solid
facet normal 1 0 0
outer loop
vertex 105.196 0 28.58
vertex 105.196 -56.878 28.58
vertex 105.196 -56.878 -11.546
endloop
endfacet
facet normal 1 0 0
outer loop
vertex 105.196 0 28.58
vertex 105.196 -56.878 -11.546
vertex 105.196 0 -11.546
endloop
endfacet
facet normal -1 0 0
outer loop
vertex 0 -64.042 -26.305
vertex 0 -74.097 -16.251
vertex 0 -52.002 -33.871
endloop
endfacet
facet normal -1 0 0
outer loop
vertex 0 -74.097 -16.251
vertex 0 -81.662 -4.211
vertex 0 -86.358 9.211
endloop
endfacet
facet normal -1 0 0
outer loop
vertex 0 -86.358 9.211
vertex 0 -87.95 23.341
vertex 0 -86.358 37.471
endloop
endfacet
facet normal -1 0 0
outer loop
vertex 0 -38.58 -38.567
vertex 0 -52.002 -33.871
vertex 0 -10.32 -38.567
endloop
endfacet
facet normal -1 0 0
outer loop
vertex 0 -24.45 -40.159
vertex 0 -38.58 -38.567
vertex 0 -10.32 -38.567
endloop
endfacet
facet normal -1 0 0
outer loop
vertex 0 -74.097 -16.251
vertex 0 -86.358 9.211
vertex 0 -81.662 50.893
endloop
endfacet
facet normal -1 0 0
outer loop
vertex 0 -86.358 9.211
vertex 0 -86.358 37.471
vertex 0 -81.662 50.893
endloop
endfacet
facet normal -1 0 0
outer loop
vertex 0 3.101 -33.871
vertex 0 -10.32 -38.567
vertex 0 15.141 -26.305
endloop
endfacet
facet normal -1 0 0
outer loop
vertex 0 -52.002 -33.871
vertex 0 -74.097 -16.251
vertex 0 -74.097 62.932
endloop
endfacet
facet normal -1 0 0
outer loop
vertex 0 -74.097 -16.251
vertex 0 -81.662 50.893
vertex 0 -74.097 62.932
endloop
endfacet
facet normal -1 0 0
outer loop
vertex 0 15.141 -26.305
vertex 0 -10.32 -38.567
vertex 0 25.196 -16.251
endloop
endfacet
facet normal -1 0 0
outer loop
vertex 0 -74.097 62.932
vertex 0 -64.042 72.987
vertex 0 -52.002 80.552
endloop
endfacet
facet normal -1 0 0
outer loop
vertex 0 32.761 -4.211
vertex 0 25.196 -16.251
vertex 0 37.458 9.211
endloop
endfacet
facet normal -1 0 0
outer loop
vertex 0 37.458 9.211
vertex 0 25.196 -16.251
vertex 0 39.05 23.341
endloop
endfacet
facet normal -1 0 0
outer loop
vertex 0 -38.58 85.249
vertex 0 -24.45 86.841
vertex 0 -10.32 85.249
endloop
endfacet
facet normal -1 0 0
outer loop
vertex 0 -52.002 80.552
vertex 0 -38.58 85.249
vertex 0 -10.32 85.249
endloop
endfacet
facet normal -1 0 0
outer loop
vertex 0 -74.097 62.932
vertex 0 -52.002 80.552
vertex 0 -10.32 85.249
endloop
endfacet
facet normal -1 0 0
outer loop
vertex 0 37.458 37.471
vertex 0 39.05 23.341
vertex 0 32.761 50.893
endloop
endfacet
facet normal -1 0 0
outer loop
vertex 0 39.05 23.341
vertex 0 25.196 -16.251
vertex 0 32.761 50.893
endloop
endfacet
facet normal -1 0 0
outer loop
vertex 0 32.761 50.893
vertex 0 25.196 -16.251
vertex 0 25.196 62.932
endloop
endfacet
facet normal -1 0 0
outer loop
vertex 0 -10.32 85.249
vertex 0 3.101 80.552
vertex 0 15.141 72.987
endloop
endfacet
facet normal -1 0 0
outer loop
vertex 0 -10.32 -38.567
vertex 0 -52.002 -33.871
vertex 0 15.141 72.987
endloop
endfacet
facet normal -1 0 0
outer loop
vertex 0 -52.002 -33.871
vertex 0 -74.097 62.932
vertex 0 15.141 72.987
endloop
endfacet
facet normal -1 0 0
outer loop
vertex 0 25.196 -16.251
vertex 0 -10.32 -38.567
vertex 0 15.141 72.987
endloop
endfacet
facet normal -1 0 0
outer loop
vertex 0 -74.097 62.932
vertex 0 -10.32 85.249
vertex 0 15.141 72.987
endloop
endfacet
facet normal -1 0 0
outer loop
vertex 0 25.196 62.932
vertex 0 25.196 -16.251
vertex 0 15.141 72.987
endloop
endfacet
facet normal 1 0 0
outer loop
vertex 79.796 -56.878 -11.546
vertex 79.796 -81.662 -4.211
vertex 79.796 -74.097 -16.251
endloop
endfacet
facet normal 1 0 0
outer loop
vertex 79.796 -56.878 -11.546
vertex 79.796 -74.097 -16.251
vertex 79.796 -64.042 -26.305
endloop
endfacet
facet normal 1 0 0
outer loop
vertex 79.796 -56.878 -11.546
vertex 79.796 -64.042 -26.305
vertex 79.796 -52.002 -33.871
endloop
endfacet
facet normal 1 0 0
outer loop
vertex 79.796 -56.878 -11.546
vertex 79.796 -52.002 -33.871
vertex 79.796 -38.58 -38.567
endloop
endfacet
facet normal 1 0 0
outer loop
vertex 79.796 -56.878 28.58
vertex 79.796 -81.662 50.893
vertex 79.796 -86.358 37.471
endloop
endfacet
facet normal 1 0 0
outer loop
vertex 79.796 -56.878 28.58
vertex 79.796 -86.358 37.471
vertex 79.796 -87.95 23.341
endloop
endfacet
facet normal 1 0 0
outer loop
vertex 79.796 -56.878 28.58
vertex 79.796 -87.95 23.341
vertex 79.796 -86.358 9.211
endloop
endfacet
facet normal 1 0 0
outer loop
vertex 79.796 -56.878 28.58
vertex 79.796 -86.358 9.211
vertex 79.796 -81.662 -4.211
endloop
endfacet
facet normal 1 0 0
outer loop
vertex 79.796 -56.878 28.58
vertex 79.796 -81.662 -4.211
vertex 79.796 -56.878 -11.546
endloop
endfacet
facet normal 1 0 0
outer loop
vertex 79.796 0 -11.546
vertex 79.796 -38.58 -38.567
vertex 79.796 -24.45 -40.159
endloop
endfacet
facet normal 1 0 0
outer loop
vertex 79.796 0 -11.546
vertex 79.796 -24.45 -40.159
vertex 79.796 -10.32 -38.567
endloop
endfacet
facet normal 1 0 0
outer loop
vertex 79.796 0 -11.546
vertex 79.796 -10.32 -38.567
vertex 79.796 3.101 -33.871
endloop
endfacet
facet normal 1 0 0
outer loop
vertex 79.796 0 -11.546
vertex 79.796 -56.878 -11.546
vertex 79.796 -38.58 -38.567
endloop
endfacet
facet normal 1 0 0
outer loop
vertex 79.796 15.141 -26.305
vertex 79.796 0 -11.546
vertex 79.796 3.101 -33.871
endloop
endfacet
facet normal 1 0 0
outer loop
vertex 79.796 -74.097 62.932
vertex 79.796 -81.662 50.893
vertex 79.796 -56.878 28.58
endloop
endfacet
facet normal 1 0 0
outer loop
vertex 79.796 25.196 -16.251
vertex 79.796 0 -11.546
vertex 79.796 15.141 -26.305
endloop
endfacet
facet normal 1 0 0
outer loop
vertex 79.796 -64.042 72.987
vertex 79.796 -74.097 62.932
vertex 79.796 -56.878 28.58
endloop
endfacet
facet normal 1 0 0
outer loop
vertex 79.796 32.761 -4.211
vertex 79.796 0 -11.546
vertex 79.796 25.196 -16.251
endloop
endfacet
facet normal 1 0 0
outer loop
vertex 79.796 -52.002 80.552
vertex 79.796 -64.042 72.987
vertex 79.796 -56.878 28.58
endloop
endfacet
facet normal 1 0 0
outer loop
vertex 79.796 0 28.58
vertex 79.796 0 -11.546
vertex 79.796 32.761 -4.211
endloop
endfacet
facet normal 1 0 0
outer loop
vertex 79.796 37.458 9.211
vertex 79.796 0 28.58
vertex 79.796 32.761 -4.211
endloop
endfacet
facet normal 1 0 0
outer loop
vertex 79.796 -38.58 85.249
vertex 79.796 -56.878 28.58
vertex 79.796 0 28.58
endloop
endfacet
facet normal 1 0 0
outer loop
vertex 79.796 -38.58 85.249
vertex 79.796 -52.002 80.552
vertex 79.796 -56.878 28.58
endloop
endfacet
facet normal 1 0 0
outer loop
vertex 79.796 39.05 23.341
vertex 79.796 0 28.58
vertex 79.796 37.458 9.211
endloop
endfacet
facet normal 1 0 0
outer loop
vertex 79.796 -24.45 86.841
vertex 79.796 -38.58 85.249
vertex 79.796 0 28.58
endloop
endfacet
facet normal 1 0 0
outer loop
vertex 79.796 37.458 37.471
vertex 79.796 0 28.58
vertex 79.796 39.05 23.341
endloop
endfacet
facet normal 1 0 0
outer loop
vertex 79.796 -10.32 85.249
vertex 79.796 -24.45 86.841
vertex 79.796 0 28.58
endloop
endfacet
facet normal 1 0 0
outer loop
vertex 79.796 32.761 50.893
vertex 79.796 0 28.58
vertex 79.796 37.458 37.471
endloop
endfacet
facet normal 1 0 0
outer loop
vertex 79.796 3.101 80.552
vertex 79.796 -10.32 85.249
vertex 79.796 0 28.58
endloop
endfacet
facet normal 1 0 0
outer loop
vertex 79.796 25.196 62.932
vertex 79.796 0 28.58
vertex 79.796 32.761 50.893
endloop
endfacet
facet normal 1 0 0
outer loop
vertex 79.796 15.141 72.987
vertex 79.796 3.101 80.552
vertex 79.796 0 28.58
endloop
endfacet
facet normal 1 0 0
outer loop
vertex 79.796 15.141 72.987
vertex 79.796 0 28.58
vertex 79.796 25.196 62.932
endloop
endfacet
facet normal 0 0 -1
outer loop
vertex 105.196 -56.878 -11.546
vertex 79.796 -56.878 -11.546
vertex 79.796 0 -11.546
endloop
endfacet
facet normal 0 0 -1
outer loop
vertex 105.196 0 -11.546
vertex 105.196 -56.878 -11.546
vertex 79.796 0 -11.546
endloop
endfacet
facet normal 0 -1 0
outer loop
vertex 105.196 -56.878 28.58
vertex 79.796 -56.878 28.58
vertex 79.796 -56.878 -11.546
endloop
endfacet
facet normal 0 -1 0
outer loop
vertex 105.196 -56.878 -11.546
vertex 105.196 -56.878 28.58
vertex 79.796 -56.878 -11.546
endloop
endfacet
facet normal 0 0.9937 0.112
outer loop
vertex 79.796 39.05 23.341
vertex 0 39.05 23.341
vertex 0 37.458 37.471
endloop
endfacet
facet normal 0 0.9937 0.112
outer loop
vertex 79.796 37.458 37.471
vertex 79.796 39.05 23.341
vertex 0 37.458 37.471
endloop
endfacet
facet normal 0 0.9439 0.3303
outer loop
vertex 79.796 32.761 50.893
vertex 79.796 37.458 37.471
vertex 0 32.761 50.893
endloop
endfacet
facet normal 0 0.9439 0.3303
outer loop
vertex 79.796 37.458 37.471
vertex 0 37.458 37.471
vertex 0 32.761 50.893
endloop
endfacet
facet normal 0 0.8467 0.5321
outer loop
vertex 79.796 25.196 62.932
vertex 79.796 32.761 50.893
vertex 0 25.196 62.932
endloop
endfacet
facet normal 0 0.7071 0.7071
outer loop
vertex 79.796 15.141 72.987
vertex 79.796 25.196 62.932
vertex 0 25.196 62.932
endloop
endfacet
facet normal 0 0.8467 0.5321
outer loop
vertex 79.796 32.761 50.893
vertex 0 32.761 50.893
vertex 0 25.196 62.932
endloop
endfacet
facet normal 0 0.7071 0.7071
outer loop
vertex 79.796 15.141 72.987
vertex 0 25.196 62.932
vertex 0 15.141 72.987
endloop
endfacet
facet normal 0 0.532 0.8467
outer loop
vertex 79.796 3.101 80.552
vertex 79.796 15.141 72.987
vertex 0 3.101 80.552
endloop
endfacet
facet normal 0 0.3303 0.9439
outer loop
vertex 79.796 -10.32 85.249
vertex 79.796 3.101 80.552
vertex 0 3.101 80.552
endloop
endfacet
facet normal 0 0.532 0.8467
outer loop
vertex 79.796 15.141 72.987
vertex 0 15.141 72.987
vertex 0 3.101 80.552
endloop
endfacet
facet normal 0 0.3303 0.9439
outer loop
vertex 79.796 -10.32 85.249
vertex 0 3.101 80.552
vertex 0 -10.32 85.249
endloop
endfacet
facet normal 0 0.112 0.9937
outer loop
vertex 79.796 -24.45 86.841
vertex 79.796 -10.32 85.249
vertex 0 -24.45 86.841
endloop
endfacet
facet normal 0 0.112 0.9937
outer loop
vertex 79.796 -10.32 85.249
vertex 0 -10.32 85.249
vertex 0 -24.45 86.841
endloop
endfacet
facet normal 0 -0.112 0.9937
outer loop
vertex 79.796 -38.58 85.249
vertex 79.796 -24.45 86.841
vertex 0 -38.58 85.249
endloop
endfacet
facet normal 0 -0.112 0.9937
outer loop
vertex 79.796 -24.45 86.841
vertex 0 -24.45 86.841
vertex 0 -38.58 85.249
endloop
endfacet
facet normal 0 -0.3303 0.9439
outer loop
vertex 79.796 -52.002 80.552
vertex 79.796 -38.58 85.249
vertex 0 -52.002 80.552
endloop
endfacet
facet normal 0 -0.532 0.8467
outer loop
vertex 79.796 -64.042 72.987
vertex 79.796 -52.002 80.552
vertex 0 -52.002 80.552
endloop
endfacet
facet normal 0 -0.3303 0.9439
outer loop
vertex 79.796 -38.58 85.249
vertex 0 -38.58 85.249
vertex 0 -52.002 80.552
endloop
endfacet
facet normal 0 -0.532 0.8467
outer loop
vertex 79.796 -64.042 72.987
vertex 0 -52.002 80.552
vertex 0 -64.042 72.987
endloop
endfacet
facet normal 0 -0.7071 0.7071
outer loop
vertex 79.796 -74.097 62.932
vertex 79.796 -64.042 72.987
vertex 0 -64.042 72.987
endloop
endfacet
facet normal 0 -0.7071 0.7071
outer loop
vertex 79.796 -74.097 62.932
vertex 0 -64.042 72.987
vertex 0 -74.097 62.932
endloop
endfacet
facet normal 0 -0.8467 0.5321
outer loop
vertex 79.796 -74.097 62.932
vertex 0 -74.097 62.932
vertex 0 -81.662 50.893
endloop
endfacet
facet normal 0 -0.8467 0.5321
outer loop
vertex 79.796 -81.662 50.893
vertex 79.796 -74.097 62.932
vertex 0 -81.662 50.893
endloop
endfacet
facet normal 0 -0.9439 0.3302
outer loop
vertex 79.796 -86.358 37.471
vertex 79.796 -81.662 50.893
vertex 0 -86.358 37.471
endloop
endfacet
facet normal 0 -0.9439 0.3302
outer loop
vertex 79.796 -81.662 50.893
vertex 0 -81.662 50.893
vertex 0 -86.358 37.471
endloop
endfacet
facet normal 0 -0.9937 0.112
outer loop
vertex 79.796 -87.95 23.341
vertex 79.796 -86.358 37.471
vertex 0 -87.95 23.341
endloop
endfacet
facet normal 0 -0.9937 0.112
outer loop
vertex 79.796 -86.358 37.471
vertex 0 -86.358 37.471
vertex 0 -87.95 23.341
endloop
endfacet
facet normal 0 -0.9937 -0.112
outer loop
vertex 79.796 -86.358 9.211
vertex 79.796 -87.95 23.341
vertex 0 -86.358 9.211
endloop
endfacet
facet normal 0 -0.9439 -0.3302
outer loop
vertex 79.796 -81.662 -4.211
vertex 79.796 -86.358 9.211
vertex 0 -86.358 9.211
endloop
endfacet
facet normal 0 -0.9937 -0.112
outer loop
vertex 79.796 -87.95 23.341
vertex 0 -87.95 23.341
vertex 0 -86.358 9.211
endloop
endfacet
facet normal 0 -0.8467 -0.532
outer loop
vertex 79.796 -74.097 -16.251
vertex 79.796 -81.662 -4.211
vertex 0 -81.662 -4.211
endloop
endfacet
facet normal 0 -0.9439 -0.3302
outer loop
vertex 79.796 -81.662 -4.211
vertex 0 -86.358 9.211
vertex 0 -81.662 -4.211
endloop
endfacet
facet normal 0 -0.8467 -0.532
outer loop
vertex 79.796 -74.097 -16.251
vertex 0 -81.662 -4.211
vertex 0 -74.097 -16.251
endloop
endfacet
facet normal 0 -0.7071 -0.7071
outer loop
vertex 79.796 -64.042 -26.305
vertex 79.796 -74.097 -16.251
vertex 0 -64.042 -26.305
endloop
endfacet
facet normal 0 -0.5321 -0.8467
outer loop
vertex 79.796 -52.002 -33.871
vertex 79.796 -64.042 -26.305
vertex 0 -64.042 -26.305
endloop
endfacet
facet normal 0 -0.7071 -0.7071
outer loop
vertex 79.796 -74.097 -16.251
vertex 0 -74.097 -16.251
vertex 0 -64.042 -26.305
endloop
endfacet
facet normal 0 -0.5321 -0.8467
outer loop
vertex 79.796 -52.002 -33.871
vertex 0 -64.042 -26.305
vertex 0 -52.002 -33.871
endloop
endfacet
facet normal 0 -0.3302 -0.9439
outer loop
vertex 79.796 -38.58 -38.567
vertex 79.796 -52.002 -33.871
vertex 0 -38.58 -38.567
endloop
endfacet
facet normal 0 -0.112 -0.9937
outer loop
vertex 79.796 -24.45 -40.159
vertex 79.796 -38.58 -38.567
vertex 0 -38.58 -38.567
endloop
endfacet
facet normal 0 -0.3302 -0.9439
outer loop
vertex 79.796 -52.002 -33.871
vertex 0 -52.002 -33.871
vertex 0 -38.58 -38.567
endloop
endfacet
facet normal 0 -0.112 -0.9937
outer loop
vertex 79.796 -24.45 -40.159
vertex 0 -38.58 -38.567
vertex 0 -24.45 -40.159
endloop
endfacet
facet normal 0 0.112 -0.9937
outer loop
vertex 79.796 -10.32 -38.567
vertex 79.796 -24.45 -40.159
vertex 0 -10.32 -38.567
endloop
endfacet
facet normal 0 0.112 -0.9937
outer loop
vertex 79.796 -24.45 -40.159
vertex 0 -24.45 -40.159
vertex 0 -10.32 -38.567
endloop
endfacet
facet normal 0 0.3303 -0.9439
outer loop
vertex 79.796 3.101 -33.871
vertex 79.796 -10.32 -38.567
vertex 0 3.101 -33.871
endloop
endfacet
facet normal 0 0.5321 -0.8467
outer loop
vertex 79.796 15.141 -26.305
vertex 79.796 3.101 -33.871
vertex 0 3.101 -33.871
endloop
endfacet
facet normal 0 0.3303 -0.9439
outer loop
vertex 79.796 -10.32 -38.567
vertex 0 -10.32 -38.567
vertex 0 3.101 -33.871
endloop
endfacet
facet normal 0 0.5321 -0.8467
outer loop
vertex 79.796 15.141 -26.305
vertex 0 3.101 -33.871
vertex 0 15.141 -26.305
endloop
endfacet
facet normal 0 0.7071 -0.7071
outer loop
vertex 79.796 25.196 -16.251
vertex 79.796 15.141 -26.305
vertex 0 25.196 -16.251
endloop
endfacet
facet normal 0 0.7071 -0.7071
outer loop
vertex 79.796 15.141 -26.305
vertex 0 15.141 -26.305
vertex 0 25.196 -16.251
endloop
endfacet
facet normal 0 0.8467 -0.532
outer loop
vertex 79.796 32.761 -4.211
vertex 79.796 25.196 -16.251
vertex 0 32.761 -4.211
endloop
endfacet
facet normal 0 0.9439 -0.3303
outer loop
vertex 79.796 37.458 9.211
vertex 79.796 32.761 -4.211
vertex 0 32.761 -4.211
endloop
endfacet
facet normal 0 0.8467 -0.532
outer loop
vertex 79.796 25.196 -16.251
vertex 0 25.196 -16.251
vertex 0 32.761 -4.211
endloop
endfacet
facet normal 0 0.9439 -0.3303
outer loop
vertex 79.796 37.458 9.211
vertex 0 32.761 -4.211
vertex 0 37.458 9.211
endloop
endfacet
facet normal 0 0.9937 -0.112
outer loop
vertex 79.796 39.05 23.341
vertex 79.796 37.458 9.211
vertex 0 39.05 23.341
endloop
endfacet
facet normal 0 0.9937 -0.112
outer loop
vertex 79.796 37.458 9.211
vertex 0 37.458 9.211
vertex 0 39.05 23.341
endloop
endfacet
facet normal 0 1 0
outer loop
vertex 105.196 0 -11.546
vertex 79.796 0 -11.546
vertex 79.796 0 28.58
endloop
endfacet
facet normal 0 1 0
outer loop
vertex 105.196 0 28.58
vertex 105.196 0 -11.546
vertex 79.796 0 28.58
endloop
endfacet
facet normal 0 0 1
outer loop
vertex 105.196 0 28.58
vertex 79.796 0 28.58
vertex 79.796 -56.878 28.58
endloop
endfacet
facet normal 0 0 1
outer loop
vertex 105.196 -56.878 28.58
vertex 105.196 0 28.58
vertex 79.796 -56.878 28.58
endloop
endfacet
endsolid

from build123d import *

# Parameters (mm, degrees)
F0_R     = 63.5
F1_DEPTH = 79.796453
F3_DEPTH = 40.894
F4_DEPTH = 25.4


with BuildPart() as f1:
    # F0 (on Right) → F1 (new body)
    with BuildSketch(Plane.YZ):
        with Locations((-24.450228, 23.340883)):
            Circle(F0_R)
    extrude(amount=F1_DEPTH)

    # F2 (on face) → F3 (join)
    with BuildSketch(Plane.YZ.offset(79.796453)):
        Polygon((0, 28.579665), (-56.877885, 28.579665), (-56.877885, -11.546232), (0, -11.546232), (0, 8.516717), align=None)
    extrude(amount=-F3_DEPTH)

    # F2 (on face) → F4 (join)
    with BuildSketch(Plane.YZ.offset(79.796453)):
        Polygon((0, 28.579665), (-56.877885, 28.579665), (-56.877885, -11.546232), (0, -11.546232), (0, 8.516717), align=None)
    extrude(amount=F4_DEPTH)


solid = f1.part
